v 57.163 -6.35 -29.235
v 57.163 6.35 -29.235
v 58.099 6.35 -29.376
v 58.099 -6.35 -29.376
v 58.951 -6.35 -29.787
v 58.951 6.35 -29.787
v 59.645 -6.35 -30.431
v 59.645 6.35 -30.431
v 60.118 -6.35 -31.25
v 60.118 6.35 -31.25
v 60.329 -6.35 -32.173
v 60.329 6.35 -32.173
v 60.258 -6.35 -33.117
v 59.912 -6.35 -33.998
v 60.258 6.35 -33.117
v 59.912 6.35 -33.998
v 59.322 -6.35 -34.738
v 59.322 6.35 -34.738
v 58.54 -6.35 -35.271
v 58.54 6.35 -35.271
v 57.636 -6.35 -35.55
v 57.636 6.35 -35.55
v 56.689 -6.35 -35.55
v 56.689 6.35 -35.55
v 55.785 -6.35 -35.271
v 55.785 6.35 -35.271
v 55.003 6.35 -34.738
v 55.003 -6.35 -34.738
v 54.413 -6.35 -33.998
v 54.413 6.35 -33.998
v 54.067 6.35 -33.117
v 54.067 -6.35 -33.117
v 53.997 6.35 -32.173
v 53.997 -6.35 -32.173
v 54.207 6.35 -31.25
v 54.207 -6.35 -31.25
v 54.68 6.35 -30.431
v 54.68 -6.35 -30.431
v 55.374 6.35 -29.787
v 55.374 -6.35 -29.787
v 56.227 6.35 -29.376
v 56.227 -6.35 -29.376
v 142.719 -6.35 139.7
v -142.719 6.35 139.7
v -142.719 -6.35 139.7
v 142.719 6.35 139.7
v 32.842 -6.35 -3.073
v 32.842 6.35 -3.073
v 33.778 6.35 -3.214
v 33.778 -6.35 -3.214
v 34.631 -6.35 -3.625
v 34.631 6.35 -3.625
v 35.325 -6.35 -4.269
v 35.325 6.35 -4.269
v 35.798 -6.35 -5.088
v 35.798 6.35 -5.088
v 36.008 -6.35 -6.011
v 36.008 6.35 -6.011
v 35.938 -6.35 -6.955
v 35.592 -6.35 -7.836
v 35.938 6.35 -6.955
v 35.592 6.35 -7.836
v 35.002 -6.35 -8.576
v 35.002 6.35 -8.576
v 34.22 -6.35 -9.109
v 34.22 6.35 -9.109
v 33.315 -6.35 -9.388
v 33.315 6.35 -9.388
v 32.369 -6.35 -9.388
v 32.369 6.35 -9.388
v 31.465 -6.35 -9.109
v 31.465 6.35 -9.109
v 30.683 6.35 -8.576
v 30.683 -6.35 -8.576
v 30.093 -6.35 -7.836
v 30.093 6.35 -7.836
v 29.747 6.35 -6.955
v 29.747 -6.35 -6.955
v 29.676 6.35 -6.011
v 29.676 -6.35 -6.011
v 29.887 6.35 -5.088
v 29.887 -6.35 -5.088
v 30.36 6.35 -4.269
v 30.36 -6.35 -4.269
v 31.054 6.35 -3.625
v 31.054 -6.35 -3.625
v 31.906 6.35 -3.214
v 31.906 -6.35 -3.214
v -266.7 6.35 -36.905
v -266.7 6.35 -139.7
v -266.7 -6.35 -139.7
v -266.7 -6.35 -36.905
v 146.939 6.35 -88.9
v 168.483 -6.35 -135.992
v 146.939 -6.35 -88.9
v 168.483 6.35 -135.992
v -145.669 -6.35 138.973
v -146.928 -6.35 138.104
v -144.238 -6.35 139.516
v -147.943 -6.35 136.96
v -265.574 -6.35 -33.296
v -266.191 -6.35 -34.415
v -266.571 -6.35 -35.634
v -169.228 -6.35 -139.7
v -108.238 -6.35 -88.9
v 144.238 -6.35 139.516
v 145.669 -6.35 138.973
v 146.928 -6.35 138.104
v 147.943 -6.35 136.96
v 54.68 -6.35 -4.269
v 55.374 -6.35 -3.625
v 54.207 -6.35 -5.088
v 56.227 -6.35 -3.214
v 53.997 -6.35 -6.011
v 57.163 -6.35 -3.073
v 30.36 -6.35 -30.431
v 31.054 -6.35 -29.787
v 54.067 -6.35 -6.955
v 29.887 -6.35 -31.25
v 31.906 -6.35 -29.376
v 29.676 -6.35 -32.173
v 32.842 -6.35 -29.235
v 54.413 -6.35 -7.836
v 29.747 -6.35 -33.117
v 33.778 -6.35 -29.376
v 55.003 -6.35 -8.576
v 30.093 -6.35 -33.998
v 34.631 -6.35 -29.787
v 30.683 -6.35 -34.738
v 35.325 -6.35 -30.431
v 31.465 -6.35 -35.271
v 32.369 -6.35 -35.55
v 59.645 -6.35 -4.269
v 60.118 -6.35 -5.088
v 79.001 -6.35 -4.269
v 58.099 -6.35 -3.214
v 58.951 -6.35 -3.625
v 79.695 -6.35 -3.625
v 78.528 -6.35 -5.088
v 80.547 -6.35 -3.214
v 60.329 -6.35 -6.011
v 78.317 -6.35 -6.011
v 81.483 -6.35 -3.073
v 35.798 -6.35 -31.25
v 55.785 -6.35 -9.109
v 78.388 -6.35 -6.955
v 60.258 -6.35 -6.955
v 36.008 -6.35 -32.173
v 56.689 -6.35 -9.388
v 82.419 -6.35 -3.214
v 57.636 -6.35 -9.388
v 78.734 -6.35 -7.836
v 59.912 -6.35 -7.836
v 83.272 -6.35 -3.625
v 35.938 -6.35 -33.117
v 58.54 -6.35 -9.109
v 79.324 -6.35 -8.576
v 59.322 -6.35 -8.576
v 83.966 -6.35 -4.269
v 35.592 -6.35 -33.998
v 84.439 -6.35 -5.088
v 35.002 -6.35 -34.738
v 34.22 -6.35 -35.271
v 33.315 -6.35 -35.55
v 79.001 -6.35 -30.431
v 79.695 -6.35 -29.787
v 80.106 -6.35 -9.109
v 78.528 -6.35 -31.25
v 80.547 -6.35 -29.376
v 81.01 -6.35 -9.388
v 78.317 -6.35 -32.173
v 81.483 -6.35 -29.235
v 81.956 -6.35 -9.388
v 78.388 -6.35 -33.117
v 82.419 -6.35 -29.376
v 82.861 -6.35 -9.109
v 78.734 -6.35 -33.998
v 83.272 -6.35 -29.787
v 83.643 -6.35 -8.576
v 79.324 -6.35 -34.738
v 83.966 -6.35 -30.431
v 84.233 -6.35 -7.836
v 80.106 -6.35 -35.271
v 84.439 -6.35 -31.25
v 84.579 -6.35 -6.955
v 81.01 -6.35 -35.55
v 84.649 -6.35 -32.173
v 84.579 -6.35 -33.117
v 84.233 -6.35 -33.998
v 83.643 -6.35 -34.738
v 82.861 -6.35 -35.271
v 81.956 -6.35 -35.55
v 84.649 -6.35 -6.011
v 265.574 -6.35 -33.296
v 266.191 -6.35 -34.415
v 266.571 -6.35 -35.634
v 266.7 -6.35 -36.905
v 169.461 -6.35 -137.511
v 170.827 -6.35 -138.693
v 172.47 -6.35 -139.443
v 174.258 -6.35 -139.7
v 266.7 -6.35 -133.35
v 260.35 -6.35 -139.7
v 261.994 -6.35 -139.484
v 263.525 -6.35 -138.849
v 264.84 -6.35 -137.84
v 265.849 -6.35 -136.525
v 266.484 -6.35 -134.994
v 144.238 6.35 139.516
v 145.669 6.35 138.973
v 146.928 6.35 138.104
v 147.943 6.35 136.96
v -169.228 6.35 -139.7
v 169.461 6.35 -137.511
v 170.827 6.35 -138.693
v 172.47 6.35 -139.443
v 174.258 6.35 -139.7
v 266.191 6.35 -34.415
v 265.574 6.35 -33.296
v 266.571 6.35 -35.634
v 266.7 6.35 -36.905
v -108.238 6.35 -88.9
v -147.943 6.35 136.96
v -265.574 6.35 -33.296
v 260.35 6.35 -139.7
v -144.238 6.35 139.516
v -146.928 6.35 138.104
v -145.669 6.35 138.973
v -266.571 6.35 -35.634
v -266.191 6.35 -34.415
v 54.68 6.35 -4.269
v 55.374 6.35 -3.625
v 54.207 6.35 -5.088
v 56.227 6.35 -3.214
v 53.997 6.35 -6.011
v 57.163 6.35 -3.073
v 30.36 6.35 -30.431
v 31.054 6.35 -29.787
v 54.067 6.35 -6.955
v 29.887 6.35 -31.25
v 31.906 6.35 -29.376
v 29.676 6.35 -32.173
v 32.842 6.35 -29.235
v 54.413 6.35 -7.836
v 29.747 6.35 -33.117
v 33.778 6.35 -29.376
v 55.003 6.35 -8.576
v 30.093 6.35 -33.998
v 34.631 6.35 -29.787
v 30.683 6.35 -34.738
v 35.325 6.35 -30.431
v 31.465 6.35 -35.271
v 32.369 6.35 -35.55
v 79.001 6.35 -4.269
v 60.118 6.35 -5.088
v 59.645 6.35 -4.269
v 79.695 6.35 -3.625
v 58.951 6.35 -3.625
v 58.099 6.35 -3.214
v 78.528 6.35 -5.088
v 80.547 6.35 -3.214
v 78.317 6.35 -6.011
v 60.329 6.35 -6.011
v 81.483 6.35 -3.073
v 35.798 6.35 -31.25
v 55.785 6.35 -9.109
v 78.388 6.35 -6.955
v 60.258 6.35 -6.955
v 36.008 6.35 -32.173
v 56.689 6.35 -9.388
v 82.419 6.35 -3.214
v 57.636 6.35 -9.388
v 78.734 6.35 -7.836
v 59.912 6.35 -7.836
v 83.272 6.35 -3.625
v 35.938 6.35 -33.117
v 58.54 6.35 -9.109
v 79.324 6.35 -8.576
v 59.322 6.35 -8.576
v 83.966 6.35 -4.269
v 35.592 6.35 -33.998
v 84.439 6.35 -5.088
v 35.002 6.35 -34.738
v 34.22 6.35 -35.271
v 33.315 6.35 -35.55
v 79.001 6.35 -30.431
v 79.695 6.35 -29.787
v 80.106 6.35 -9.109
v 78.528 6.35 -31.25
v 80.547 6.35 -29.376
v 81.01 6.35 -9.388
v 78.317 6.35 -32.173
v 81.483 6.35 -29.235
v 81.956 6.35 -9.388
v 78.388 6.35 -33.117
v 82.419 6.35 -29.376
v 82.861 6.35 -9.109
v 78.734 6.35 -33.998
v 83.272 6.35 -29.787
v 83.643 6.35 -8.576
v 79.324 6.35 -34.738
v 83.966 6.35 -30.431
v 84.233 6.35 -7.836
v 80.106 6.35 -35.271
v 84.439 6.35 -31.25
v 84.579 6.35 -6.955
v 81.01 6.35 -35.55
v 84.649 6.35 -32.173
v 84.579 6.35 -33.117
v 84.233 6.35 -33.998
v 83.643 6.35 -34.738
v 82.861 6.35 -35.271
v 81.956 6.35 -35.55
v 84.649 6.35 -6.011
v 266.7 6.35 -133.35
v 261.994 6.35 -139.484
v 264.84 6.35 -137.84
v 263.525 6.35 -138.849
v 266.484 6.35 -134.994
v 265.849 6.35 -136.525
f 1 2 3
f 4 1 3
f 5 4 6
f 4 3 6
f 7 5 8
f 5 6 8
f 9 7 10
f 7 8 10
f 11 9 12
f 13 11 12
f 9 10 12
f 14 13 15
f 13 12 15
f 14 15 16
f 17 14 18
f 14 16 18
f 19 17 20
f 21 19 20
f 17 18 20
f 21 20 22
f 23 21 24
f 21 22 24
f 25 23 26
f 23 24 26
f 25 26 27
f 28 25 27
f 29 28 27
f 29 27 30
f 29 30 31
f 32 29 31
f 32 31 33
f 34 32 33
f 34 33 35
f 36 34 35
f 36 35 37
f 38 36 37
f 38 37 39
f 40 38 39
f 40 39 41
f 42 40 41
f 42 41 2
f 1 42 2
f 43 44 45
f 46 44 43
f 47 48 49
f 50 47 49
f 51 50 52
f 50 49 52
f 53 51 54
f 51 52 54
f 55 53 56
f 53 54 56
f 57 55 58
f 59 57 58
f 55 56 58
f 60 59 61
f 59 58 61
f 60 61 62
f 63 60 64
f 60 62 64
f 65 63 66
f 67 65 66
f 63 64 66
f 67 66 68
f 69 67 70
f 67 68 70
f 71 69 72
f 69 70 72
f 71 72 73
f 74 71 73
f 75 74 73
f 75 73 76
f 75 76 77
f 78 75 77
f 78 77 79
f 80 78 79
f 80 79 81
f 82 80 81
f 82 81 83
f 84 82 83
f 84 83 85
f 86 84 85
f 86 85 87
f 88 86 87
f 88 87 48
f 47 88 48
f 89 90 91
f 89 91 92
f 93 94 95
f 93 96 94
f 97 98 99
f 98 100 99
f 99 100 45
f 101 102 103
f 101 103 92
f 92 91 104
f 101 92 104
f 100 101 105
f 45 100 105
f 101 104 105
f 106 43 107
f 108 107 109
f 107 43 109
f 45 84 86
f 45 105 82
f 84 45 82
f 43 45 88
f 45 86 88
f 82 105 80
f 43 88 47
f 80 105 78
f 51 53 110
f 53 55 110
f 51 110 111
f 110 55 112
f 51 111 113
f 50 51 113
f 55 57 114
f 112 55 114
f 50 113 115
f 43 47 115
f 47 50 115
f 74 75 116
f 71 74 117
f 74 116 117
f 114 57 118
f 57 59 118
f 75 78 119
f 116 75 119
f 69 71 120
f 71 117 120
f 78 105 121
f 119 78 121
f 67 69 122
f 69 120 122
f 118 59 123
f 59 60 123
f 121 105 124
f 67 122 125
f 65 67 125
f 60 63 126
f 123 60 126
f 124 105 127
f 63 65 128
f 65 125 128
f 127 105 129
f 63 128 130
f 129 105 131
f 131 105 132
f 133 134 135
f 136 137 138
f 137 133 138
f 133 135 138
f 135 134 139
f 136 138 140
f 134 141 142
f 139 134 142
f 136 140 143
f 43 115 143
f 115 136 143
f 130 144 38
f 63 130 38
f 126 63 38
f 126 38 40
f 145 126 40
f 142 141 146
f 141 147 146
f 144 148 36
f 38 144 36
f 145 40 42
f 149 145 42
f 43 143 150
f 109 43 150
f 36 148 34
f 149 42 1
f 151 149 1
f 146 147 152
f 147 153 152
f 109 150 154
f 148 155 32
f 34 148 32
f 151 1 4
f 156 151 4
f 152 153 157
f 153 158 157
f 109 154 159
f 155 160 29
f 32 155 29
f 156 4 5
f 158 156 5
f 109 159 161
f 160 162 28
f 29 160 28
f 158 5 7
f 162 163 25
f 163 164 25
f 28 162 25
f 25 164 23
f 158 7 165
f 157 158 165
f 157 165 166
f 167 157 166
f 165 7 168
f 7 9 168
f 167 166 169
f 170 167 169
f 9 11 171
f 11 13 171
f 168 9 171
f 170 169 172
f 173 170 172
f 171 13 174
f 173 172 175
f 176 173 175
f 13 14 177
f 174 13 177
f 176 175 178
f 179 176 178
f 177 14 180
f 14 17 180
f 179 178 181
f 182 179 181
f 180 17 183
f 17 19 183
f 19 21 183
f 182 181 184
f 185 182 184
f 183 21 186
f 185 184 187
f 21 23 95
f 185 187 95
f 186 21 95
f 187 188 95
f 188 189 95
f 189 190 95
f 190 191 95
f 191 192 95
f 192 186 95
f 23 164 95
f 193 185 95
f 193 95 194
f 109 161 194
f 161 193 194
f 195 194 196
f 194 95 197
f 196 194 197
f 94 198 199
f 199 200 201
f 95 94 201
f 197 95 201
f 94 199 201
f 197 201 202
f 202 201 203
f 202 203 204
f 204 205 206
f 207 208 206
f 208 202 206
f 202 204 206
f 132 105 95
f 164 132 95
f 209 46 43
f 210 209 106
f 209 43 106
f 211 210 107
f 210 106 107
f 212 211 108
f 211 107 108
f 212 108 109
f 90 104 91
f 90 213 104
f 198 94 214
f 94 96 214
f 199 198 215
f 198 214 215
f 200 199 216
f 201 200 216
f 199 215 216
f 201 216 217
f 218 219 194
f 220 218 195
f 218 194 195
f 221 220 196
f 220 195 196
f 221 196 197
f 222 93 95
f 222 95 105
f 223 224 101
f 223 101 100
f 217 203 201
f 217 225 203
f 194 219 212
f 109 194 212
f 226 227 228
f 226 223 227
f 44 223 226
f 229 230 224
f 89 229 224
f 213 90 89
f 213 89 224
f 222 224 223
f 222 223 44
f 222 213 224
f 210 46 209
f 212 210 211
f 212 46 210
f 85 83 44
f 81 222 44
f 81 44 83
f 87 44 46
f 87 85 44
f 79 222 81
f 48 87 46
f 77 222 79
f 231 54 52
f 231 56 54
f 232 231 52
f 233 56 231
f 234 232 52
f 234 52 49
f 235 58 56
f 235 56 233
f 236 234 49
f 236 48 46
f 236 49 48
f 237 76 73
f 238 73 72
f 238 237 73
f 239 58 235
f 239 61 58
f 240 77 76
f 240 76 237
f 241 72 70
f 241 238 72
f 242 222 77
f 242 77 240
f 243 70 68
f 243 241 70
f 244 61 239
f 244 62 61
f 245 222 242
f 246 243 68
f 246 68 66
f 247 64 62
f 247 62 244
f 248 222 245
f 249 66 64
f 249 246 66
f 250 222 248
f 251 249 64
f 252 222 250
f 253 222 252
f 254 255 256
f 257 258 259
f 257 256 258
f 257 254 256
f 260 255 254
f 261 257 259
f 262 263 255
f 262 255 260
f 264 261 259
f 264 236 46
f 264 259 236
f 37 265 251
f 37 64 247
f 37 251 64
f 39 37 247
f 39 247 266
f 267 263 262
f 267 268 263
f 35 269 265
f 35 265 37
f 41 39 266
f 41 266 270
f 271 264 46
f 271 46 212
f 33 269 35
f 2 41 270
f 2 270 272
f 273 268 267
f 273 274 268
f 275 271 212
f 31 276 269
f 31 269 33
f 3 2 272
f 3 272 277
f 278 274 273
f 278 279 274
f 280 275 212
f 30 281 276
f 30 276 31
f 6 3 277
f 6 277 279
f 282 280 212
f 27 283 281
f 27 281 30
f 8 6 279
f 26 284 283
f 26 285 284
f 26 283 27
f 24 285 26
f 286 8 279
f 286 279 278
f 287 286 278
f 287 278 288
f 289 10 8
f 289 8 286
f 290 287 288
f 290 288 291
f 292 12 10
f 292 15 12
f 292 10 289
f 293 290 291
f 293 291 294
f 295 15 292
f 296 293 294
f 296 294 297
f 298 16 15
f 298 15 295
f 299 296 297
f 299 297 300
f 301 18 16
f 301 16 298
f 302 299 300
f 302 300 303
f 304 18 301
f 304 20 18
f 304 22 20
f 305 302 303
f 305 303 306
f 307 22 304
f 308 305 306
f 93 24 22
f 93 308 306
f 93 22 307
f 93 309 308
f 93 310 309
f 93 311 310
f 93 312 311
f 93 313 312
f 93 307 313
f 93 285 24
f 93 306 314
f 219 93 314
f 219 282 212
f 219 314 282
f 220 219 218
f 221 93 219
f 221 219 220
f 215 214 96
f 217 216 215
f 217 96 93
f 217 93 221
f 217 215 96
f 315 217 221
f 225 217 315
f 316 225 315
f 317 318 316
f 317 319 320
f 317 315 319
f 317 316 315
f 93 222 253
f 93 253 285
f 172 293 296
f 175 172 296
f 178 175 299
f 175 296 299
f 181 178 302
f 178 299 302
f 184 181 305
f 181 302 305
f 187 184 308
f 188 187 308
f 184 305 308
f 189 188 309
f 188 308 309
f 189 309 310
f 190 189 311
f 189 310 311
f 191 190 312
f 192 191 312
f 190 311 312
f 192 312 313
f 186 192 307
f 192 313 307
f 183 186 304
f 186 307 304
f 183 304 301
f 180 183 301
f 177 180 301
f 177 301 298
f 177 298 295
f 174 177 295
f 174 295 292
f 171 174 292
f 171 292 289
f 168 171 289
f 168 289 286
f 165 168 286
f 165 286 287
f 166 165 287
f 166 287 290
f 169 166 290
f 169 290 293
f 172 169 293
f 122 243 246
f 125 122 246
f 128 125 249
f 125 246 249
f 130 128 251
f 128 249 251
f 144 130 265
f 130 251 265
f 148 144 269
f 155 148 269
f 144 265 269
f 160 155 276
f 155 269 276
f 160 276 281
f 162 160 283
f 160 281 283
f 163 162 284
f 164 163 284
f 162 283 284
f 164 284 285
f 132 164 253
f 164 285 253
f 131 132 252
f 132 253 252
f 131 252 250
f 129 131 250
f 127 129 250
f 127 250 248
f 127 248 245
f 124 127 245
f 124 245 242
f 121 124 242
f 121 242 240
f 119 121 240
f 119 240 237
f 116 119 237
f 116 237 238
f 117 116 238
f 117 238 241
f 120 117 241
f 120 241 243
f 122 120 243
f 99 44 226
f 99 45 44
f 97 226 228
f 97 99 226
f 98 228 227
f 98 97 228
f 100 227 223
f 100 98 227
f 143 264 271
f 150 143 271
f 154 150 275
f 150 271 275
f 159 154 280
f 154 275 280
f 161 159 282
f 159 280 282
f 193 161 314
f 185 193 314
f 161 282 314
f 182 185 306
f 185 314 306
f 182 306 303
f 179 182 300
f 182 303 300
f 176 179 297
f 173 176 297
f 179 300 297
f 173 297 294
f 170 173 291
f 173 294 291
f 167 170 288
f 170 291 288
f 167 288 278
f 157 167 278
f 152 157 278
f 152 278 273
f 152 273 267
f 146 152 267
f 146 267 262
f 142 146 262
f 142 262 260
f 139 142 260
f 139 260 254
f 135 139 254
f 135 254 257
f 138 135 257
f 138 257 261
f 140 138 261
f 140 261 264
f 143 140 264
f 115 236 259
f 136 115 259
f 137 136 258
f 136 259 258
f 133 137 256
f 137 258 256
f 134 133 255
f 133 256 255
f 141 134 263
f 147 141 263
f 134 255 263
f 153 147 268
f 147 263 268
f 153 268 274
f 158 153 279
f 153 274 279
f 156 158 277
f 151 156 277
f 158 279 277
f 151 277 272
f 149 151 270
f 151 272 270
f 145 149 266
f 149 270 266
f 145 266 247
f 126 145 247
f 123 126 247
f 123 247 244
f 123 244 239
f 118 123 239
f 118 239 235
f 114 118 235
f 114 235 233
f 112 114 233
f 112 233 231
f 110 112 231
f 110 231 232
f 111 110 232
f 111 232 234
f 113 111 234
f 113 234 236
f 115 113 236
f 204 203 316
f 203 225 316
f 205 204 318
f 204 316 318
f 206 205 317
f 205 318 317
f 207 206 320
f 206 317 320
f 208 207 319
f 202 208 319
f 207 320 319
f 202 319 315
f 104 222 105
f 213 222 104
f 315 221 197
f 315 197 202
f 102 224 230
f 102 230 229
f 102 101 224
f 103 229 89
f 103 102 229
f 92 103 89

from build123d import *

# Parameters (mm, degrees)
BOSS_EXTRUDE1_DEPTH = 6.35
SKETCH2_R           = 3.175
CUT_EXTRUDE1_DEPTH  = 302.34078715
CUT_EXTRUDE2_DEPTH  = 302.34078715
FILLET1_R           = 6.35


with BuildPart() as part:
    # Sketch1 → Boss-Extrude1 (new, symmetric)
    with BuildSketch(Plane(origin=(0, 0, 0), x_dir=(1, 0, 0), z_dir=(0, 1, 0))):
        Polygon((-266.7, -139.7), (266.7, -139.7), (266.7, 139.7), (170.18, 139.7), (146.939, 88.9), (-108.237741638, 88.9), (-169.2275, 139.7), (-266.7, 139.7), align=None)
    extrude(amount=BOSS_EXTRUDE1_DEPTH, both=True)

    # Sketch2 → Cut-Extrude1 (cut, through all)
    with BuildSketch(Plane(origin=(0, 6.35, 0), x_dir=(1, 0, 0), z_dir=(0, 1, 0))):
        with Locations(Location((81.4832, 6.2484, 0), (0, 0, 270))):
            Circle(SKETCH2_R)
        with Locations(Location((81.4832, 32.4104, 0), (0, 0, 270))):
            Circle(SKETCH2_R)
        with Locations(Location((57.1627, 32.4104, 0), (0, 0, 270))):
            Circle(SKETCH2_R)
        with Locations(Location((32.8422, 32.4104, 0), (0, 0, 270))):
            Circle(SKETCH2_R)
        with Locations(Location((32.8422, 6.2484, 0), (0, 0, 270))):
            Circle(SKETCH2_R)
        with Locations(Location((57.1627, 6.2484, 0), (0, 0, 270))):
            Circle(SKETCH2_R)
    extrude(amount=-CUT_EXTRUDE1_DEPTH, mode=Mode.SUBTRACT)

    # Sketch3 → Cut-Extrude2 (cut, through all)
    with BuildSketch(Plane(origin=(0, 6.35, 0), x_dir=(1, 0, 0), z_dir=(0, 1, 0))):
        Polygon((-266.7, 34.925), (-146.05, -139.7), (-266.7, -139.7), align=None)
    cut_extrude2 = extrude(amount=-CUT_EXTRUDE2_DEPTH, mode=Mode.SUBTRACT)

    # Mirror1: Cut-Extrude2 across plane
    add(cut_extrude2.mirror(Plane(origin=(0, 0, 0), x_dir=(0, 0, 1), z_dir=(1, 0, 0))), mode=Mode.SUBTRACT)

    # Fillet1
    fillet1_edges = [part.edges().sort_by_distance(p)[0] for p in [
        (170.18, 0, -139.7),
        (266.7, 0, -139.7),
        (-266.7, 0, -34.925),
        (-146.05, 0, 139.7),
        (266.7, 0, -34.925),
        (146.05, 0, 139.7),
    ]]
    fillet(fillet1_edges, radius=FILLET1_R)


solid = part.part
